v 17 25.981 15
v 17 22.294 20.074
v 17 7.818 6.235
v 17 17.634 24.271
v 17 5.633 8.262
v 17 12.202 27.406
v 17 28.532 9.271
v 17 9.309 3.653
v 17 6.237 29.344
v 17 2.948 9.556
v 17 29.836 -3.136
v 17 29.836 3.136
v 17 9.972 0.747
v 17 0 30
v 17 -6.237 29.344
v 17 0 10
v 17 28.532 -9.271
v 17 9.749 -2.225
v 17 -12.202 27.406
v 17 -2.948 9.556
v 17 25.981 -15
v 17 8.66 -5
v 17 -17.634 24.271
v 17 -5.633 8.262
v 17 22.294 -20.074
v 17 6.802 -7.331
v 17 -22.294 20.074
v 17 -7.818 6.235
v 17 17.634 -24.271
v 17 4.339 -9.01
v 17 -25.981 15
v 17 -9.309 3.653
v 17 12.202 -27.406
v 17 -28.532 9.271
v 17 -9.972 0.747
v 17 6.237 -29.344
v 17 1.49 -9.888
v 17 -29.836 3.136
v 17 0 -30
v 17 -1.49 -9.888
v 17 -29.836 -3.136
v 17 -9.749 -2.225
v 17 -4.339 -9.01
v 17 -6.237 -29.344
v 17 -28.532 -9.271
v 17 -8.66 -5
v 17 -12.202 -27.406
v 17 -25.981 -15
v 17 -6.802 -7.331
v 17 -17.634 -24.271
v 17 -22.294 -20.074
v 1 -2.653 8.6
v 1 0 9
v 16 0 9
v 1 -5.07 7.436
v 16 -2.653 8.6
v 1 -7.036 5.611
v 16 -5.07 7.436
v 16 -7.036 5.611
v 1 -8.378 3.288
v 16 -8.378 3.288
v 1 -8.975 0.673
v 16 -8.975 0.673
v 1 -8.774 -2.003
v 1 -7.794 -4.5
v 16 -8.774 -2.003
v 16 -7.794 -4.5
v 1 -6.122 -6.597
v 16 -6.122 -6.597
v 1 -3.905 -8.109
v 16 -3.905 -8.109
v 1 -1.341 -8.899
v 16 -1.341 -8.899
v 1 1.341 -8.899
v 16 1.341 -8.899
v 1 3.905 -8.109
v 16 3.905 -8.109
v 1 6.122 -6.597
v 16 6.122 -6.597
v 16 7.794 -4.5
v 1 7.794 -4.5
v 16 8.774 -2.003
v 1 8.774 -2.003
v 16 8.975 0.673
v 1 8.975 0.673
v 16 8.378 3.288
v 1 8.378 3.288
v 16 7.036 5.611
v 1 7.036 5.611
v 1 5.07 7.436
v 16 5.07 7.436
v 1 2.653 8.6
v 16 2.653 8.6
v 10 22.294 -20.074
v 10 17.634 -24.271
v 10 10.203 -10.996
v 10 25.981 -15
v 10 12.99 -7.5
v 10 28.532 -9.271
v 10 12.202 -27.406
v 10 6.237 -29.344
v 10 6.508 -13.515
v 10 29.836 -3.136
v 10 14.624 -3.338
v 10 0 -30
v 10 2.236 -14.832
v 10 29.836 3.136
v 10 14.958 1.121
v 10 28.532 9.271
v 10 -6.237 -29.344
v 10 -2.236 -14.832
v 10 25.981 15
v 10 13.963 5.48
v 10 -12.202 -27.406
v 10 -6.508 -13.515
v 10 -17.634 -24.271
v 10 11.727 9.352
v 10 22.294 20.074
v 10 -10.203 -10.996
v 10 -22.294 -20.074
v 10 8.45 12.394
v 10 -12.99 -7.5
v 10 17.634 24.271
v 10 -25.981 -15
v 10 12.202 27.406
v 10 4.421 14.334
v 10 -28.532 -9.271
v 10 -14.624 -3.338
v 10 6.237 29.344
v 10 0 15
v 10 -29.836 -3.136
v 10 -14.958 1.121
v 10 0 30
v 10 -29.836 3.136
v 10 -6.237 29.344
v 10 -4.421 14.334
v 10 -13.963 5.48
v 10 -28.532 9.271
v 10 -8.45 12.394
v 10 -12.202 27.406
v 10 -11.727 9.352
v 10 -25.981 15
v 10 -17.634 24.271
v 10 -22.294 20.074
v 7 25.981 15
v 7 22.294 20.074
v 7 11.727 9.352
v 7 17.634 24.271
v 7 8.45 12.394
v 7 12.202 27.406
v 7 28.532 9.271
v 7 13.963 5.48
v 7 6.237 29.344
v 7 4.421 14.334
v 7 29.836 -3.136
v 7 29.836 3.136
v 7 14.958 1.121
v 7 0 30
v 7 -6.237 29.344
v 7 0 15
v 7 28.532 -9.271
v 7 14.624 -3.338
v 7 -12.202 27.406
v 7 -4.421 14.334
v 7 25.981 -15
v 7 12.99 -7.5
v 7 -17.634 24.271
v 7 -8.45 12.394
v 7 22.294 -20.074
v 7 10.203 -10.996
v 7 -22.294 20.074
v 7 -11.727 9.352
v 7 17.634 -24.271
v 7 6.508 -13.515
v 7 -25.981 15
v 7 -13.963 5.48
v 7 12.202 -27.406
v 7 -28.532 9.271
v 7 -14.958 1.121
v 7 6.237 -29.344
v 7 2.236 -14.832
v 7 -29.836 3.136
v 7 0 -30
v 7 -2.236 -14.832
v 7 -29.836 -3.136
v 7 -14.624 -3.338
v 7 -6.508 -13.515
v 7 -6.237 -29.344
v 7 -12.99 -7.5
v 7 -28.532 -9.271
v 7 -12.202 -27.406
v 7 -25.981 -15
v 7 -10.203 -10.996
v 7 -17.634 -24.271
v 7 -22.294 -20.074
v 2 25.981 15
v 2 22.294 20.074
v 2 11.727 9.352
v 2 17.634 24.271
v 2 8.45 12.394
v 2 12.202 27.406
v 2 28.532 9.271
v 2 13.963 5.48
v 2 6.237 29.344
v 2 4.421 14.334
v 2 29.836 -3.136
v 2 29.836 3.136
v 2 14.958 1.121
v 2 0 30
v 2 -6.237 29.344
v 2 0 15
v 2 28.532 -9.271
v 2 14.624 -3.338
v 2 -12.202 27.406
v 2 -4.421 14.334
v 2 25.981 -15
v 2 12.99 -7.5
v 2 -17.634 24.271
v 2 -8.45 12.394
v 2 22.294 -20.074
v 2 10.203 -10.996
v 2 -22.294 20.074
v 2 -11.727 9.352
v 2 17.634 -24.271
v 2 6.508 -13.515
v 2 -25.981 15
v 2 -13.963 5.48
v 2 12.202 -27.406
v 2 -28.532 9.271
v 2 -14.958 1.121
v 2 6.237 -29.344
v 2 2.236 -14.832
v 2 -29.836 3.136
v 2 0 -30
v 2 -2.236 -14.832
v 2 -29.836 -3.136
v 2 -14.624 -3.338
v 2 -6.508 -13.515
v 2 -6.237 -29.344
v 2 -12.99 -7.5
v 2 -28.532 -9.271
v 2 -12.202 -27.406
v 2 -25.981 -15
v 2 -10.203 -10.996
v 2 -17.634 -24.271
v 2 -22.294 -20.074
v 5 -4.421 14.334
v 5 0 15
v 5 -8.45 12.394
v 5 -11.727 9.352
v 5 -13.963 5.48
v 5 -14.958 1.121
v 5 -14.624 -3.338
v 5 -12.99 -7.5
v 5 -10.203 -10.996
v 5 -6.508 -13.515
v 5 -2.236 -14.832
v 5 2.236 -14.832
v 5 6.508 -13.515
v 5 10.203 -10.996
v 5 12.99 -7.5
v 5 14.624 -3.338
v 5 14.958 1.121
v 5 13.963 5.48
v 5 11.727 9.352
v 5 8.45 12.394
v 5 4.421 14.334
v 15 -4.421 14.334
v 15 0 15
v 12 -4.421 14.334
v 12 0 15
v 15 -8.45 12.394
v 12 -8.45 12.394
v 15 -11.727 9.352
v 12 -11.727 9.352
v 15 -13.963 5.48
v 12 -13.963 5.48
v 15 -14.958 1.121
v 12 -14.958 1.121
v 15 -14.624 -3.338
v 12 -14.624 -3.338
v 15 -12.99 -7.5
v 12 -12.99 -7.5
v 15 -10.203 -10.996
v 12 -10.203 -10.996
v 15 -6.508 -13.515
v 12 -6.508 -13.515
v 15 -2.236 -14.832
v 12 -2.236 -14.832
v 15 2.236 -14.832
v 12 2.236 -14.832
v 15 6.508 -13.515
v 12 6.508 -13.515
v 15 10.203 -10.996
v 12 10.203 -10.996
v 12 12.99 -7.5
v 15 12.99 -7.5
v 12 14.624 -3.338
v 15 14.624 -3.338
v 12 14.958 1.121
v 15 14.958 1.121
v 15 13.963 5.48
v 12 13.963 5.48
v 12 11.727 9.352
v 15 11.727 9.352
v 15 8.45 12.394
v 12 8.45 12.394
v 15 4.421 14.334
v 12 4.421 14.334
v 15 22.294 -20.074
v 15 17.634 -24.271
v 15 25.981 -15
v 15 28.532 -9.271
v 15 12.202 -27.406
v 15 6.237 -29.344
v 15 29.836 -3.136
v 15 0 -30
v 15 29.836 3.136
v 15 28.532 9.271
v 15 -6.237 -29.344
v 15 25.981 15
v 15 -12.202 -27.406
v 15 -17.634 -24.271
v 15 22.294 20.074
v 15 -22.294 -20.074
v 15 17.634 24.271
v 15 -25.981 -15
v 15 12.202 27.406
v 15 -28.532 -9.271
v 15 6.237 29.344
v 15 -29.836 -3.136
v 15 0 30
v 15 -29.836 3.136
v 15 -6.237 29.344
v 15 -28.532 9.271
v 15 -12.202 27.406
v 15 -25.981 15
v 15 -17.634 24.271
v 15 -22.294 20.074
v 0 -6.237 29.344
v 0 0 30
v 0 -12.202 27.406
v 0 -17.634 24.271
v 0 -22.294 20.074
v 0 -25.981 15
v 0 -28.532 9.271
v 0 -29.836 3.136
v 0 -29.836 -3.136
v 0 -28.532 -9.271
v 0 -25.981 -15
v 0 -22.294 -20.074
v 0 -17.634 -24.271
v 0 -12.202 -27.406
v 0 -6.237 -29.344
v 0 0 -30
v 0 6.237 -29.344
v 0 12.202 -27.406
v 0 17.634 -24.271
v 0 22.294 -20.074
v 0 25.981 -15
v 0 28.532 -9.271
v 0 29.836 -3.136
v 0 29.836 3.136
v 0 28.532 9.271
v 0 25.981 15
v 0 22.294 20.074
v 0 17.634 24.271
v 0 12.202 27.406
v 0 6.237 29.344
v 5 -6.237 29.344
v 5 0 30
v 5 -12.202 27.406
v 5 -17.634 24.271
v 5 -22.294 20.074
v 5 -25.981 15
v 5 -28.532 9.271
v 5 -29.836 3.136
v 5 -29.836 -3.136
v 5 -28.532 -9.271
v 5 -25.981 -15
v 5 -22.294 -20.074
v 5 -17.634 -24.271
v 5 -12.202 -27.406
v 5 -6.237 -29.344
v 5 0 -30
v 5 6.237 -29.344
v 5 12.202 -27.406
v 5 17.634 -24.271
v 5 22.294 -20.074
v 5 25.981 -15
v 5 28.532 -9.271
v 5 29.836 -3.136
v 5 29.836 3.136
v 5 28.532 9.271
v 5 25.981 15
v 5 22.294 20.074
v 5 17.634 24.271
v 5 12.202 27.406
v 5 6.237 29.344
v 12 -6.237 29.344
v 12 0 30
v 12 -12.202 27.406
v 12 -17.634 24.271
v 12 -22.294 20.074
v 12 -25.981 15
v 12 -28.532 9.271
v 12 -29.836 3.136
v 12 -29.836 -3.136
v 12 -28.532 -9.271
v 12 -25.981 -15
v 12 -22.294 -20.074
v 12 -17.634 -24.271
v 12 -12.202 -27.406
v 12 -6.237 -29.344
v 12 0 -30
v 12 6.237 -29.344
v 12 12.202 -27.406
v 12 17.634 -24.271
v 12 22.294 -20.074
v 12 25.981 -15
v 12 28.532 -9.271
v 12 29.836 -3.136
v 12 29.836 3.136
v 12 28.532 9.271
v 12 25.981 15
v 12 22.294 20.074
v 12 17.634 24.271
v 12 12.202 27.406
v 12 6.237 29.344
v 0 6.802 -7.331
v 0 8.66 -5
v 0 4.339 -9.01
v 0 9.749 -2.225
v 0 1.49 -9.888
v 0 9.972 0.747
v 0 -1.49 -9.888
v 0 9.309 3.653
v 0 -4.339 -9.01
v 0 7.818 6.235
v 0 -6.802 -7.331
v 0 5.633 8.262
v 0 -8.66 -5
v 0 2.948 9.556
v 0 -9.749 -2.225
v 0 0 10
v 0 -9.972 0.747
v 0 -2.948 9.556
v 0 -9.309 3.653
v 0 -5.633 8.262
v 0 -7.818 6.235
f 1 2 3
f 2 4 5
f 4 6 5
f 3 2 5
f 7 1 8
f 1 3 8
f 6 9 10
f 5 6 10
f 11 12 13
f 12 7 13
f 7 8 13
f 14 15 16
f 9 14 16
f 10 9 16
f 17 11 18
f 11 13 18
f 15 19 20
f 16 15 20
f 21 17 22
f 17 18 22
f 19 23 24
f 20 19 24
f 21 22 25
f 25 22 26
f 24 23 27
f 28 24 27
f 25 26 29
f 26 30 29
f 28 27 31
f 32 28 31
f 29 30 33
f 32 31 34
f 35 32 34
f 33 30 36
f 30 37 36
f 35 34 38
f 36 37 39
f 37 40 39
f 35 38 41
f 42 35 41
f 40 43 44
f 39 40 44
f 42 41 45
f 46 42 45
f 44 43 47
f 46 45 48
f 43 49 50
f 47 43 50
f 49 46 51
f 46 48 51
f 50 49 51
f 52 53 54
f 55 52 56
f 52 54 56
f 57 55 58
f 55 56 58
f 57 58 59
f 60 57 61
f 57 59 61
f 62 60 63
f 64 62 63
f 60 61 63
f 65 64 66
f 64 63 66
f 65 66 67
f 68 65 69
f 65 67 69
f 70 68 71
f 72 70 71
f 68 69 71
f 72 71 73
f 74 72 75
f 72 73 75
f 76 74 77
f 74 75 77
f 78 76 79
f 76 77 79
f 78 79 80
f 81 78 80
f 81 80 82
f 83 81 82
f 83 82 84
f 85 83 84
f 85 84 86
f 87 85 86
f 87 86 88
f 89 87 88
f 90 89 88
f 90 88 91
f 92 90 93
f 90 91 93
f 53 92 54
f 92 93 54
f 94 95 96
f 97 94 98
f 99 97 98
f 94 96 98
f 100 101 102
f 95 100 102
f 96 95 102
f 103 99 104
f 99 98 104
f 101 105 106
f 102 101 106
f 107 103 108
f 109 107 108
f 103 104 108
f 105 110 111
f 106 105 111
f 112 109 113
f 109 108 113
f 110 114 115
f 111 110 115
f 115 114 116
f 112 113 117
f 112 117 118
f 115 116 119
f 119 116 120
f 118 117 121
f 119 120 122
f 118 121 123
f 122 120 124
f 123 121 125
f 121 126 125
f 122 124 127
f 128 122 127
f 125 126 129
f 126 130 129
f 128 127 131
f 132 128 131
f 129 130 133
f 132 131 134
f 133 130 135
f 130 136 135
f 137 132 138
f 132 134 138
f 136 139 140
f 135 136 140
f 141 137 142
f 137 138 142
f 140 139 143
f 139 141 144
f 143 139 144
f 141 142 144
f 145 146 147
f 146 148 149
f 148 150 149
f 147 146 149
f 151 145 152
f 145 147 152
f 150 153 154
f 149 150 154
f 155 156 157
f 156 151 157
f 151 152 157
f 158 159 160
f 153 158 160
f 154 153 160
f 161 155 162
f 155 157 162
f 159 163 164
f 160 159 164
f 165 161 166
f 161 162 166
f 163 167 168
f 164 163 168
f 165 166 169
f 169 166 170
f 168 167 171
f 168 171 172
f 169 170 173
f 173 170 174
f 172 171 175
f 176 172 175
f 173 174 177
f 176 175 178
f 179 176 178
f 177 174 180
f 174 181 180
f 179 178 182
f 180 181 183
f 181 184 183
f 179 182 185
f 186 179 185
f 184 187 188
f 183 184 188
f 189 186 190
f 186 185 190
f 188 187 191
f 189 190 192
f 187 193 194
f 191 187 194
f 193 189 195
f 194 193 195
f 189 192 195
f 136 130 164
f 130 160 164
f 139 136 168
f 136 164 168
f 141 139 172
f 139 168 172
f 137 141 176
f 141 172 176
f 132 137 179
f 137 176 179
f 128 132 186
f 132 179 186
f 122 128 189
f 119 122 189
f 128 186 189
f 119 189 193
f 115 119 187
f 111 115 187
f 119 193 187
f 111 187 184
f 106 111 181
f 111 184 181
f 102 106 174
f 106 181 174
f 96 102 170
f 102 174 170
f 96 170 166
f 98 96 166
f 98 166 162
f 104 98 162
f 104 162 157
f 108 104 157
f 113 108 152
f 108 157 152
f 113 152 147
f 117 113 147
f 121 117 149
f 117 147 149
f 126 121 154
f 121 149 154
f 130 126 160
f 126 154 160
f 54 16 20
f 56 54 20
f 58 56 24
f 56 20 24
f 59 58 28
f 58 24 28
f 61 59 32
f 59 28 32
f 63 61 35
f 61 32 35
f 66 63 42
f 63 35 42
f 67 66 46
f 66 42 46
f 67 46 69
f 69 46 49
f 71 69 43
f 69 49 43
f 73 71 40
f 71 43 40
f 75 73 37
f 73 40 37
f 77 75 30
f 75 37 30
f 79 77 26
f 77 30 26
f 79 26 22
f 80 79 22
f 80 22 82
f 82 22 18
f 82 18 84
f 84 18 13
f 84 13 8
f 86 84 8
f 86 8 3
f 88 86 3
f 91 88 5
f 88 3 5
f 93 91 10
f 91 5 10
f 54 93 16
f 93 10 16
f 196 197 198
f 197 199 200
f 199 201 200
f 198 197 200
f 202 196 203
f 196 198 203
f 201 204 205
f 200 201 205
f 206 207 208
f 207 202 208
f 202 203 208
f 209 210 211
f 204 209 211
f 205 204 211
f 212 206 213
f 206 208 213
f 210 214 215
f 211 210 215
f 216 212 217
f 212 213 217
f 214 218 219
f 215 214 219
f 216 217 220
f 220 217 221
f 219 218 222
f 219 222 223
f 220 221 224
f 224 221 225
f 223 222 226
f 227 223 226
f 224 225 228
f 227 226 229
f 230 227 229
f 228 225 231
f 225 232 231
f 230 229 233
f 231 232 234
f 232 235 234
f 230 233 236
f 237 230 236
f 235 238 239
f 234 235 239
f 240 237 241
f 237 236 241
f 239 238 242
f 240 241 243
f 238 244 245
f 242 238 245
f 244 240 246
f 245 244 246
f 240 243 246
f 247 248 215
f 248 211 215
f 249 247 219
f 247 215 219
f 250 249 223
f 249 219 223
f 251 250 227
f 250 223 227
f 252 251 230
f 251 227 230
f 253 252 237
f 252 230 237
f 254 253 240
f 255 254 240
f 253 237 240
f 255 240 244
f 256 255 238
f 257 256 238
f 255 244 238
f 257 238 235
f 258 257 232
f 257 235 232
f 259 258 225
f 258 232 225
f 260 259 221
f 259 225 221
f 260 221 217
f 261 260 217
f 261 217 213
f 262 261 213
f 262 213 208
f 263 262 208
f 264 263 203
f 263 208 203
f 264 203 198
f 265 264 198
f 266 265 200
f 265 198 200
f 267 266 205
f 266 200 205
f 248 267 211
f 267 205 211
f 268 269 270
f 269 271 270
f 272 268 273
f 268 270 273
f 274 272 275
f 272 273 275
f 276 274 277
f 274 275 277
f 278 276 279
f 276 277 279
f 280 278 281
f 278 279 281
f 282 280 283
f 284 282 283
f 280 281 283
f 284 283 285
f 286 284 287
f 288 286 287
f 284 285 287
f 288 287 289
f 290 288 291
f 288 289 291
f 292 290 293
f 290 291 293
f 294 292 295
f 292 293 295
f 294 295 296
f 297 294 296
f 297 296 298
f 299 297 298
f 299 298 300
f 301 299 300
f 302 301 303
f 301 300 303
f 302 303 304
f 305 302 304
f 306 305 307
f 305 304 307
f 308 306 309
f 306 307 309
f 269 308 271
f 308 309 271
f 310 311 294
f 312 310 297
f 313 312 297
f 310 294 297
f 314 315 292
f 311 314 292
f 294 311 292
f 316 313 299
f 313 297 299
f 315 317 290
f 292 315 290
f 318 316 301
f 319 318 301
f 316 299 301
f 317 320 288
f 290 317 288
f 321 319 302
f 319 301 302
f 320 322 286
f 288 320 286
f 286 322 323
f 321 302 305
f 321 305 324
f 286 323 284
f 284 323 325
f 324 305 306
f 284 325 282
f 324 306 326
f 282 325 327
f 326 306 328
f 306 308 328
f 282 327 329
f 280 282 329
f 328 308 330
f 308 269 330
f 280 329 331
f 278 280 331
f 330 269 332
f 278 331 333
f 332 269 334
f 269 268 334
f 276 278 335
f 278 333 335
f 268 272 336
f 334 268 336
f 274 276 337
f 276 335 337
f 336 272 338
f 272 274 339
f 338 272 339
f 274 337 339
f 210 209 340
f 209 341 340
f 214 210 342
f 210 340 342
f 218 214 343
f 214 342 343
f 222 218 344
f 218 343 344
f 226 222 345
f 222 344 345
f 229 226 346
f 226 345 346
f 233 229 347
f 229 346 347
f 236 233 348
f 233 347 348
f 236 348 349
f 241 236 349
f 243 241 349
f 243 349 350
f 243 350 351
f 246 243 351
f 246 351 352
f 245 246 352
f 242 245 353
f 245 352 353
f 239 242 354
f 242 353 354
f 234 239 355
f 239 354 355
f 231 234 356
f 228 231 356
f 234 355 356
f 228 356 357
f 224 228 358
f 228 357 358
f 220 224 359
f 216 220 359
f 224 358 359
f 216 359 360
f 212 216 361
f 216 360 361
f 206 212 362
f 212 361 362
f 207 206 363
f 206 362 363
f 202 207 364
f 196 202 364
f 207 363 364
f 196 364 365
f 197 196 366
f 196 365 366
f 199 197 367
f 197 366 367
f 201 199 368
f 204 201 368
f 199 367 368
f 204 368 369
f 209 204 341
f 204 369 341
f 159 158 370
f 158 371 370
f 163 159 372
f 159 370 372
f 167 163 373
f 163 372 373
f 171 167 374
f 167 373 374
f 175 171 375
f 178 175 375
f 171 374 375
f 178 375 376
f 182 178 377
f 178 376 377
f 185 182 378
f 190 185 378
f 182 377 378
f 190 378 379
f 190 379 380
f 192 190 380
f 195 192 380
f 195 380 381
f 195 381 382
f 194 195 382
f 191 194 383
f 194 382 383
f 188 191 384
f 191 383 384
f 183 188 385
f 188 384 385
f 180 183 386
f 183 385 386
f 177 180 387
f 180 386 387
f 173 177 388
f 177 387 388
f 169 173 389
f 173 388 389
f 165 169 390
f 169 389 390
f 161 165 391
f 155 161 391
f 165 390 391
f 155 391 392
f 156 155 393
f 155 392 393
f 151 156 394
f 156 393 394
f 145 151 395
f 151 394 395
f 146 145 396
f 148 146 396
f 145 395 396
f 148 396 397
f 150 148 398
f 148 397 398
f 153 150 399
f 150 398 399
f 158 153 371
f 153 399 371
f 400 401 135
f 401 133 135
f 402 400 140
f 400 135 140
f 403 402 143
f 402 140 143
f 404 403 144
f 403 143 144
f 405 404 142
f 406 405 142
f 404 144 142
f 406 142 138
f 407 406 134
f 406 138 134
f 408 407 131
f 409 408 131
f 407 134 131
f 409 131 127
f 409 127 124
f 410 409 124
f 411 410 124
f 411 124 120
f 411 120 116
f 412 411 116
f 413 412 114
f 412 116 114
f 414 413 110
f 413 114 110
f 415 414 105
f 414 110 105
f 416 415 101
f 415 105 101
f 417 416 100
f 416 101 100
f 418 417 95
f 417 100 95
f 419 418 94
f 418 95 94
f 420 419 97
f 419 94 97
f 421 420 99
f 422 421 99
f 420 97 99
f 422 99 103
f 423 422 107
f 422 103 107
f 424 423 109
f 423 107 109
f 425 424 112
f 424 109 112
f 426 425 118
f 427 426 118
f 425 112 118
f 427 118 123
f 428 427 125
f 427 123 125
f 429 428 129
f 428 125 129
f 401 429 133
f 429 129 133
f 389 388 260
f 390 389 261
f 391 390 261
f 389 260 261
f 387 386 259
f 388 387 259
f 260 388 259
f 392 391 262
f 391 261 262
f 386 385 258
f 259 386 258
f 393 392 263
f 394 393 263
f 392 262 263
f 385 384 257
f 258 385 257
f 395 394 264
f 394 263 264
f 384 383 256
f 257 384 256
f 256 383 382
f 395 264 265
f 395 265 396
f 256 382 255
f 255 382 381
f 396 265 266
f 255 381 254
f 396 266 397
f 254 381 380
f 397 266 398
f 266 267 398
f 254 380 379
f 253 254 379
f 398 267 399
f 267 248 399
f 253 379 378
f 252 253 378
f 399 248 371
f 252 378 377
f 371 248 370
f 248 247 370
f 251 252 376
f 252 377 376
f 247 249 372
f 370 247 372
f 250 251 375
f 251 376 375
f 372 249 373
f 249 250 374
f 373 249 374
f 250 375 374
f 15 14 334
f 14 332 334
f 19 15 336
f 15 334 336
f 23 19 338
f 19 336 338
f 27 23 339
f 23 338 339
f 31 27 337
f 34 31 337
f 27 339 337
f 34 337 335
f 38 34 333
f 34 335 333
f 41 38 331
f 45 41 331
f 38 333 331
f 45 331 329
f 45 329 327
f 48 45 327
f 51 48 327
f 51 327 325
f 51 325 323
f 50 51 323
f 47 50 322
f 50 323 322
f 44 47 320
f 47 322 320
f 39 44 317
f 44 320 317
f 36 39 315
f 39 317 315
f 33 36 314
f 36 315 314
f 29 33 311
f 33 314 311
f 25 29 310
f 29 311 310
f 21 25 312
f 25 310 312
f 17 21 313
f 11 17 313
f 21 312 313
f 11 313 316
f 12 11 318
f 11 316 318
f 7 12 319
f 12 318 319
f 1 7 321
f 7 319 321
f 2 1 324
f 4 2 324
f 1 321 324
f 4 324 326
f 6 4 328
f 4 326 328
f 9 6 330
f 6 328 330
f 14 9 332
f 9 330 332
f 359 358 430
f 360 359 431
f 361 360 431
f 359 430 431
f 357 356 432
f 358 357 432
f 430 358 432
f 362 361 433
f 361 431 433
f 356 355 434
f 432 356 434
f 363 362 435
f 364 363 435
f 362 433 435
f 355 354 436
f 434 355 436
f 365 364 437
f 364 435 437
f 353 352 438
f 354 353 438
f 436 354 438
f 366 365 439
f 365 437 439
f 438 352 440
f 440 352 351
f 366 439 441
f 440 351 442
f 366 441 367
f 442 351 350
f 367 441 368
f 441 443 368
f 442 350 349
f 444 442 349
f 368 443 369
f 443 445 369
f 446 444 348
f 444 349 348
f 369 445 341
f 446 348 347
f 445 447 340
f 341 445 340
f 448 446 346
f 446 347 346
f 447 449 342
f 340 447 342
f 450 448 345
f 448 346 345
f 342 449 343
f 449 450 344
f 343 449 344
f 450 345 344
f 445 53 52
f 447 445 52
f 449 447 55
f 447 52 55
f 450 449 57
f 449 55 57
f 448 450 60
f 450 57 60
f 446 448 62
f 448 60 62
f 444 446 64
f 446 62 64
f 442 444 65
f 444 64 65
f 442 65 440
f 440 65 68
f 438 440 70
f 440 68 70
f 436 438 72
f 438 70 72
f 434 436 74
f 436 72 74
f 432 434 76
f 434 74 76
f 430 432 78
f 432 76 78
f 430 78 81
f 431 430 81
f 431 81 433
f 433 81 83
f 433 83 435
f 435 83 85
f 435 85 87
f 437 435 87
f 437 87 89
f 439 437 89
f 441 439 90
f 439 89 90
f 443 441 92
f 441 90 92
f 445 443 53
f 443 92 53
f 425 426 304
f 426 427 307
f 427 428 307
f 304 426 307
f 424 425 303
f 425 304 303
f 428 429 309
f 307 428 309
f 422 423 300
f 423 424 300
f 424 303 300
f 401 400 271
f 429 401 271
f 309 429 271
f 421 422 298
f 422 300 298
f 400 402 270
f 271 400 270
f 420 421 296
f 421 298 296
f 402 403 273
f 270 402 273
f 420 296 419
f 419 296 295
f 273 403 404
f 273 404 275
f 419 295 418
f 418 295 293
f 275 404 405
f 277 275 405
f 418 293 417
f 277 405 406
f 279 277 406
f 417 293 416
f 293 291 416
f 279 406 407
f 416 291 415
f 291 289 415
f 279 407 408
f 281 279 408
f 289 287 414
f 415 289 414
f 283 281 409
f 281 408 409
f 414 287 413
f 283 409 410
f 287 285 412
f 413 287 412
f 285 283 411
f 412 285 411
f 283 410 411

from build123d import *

# Parameters (mm, degrees)
F2_SIZE = 1


with BuildPart() as f1:
    # F0 (on Front) → F1 (revolve)
    with BuildSketch(Plane.XZ):
        Polygon((0, 30), (0, 9), (17, 9), (17, 30), (15, 30), (15, 15), (12, 15), (12, 30), (10, 30), (10, 15), (7, 15), (7, 30), (5, 30), (5, 15), (2, 15), (2, 30), align=None)
    revolve(axis=Axis((32.809981, 0, 0), (1, 0, 0)))

    # F2
    f2_edges = [f1.edges().sort_by_distance(p)[0] for p in [
        (0, 0, -9),
        (17, 0, -9),
    ]]
    chamfer(f2_edges, length=F2_SIZE)


solid = f1.part
